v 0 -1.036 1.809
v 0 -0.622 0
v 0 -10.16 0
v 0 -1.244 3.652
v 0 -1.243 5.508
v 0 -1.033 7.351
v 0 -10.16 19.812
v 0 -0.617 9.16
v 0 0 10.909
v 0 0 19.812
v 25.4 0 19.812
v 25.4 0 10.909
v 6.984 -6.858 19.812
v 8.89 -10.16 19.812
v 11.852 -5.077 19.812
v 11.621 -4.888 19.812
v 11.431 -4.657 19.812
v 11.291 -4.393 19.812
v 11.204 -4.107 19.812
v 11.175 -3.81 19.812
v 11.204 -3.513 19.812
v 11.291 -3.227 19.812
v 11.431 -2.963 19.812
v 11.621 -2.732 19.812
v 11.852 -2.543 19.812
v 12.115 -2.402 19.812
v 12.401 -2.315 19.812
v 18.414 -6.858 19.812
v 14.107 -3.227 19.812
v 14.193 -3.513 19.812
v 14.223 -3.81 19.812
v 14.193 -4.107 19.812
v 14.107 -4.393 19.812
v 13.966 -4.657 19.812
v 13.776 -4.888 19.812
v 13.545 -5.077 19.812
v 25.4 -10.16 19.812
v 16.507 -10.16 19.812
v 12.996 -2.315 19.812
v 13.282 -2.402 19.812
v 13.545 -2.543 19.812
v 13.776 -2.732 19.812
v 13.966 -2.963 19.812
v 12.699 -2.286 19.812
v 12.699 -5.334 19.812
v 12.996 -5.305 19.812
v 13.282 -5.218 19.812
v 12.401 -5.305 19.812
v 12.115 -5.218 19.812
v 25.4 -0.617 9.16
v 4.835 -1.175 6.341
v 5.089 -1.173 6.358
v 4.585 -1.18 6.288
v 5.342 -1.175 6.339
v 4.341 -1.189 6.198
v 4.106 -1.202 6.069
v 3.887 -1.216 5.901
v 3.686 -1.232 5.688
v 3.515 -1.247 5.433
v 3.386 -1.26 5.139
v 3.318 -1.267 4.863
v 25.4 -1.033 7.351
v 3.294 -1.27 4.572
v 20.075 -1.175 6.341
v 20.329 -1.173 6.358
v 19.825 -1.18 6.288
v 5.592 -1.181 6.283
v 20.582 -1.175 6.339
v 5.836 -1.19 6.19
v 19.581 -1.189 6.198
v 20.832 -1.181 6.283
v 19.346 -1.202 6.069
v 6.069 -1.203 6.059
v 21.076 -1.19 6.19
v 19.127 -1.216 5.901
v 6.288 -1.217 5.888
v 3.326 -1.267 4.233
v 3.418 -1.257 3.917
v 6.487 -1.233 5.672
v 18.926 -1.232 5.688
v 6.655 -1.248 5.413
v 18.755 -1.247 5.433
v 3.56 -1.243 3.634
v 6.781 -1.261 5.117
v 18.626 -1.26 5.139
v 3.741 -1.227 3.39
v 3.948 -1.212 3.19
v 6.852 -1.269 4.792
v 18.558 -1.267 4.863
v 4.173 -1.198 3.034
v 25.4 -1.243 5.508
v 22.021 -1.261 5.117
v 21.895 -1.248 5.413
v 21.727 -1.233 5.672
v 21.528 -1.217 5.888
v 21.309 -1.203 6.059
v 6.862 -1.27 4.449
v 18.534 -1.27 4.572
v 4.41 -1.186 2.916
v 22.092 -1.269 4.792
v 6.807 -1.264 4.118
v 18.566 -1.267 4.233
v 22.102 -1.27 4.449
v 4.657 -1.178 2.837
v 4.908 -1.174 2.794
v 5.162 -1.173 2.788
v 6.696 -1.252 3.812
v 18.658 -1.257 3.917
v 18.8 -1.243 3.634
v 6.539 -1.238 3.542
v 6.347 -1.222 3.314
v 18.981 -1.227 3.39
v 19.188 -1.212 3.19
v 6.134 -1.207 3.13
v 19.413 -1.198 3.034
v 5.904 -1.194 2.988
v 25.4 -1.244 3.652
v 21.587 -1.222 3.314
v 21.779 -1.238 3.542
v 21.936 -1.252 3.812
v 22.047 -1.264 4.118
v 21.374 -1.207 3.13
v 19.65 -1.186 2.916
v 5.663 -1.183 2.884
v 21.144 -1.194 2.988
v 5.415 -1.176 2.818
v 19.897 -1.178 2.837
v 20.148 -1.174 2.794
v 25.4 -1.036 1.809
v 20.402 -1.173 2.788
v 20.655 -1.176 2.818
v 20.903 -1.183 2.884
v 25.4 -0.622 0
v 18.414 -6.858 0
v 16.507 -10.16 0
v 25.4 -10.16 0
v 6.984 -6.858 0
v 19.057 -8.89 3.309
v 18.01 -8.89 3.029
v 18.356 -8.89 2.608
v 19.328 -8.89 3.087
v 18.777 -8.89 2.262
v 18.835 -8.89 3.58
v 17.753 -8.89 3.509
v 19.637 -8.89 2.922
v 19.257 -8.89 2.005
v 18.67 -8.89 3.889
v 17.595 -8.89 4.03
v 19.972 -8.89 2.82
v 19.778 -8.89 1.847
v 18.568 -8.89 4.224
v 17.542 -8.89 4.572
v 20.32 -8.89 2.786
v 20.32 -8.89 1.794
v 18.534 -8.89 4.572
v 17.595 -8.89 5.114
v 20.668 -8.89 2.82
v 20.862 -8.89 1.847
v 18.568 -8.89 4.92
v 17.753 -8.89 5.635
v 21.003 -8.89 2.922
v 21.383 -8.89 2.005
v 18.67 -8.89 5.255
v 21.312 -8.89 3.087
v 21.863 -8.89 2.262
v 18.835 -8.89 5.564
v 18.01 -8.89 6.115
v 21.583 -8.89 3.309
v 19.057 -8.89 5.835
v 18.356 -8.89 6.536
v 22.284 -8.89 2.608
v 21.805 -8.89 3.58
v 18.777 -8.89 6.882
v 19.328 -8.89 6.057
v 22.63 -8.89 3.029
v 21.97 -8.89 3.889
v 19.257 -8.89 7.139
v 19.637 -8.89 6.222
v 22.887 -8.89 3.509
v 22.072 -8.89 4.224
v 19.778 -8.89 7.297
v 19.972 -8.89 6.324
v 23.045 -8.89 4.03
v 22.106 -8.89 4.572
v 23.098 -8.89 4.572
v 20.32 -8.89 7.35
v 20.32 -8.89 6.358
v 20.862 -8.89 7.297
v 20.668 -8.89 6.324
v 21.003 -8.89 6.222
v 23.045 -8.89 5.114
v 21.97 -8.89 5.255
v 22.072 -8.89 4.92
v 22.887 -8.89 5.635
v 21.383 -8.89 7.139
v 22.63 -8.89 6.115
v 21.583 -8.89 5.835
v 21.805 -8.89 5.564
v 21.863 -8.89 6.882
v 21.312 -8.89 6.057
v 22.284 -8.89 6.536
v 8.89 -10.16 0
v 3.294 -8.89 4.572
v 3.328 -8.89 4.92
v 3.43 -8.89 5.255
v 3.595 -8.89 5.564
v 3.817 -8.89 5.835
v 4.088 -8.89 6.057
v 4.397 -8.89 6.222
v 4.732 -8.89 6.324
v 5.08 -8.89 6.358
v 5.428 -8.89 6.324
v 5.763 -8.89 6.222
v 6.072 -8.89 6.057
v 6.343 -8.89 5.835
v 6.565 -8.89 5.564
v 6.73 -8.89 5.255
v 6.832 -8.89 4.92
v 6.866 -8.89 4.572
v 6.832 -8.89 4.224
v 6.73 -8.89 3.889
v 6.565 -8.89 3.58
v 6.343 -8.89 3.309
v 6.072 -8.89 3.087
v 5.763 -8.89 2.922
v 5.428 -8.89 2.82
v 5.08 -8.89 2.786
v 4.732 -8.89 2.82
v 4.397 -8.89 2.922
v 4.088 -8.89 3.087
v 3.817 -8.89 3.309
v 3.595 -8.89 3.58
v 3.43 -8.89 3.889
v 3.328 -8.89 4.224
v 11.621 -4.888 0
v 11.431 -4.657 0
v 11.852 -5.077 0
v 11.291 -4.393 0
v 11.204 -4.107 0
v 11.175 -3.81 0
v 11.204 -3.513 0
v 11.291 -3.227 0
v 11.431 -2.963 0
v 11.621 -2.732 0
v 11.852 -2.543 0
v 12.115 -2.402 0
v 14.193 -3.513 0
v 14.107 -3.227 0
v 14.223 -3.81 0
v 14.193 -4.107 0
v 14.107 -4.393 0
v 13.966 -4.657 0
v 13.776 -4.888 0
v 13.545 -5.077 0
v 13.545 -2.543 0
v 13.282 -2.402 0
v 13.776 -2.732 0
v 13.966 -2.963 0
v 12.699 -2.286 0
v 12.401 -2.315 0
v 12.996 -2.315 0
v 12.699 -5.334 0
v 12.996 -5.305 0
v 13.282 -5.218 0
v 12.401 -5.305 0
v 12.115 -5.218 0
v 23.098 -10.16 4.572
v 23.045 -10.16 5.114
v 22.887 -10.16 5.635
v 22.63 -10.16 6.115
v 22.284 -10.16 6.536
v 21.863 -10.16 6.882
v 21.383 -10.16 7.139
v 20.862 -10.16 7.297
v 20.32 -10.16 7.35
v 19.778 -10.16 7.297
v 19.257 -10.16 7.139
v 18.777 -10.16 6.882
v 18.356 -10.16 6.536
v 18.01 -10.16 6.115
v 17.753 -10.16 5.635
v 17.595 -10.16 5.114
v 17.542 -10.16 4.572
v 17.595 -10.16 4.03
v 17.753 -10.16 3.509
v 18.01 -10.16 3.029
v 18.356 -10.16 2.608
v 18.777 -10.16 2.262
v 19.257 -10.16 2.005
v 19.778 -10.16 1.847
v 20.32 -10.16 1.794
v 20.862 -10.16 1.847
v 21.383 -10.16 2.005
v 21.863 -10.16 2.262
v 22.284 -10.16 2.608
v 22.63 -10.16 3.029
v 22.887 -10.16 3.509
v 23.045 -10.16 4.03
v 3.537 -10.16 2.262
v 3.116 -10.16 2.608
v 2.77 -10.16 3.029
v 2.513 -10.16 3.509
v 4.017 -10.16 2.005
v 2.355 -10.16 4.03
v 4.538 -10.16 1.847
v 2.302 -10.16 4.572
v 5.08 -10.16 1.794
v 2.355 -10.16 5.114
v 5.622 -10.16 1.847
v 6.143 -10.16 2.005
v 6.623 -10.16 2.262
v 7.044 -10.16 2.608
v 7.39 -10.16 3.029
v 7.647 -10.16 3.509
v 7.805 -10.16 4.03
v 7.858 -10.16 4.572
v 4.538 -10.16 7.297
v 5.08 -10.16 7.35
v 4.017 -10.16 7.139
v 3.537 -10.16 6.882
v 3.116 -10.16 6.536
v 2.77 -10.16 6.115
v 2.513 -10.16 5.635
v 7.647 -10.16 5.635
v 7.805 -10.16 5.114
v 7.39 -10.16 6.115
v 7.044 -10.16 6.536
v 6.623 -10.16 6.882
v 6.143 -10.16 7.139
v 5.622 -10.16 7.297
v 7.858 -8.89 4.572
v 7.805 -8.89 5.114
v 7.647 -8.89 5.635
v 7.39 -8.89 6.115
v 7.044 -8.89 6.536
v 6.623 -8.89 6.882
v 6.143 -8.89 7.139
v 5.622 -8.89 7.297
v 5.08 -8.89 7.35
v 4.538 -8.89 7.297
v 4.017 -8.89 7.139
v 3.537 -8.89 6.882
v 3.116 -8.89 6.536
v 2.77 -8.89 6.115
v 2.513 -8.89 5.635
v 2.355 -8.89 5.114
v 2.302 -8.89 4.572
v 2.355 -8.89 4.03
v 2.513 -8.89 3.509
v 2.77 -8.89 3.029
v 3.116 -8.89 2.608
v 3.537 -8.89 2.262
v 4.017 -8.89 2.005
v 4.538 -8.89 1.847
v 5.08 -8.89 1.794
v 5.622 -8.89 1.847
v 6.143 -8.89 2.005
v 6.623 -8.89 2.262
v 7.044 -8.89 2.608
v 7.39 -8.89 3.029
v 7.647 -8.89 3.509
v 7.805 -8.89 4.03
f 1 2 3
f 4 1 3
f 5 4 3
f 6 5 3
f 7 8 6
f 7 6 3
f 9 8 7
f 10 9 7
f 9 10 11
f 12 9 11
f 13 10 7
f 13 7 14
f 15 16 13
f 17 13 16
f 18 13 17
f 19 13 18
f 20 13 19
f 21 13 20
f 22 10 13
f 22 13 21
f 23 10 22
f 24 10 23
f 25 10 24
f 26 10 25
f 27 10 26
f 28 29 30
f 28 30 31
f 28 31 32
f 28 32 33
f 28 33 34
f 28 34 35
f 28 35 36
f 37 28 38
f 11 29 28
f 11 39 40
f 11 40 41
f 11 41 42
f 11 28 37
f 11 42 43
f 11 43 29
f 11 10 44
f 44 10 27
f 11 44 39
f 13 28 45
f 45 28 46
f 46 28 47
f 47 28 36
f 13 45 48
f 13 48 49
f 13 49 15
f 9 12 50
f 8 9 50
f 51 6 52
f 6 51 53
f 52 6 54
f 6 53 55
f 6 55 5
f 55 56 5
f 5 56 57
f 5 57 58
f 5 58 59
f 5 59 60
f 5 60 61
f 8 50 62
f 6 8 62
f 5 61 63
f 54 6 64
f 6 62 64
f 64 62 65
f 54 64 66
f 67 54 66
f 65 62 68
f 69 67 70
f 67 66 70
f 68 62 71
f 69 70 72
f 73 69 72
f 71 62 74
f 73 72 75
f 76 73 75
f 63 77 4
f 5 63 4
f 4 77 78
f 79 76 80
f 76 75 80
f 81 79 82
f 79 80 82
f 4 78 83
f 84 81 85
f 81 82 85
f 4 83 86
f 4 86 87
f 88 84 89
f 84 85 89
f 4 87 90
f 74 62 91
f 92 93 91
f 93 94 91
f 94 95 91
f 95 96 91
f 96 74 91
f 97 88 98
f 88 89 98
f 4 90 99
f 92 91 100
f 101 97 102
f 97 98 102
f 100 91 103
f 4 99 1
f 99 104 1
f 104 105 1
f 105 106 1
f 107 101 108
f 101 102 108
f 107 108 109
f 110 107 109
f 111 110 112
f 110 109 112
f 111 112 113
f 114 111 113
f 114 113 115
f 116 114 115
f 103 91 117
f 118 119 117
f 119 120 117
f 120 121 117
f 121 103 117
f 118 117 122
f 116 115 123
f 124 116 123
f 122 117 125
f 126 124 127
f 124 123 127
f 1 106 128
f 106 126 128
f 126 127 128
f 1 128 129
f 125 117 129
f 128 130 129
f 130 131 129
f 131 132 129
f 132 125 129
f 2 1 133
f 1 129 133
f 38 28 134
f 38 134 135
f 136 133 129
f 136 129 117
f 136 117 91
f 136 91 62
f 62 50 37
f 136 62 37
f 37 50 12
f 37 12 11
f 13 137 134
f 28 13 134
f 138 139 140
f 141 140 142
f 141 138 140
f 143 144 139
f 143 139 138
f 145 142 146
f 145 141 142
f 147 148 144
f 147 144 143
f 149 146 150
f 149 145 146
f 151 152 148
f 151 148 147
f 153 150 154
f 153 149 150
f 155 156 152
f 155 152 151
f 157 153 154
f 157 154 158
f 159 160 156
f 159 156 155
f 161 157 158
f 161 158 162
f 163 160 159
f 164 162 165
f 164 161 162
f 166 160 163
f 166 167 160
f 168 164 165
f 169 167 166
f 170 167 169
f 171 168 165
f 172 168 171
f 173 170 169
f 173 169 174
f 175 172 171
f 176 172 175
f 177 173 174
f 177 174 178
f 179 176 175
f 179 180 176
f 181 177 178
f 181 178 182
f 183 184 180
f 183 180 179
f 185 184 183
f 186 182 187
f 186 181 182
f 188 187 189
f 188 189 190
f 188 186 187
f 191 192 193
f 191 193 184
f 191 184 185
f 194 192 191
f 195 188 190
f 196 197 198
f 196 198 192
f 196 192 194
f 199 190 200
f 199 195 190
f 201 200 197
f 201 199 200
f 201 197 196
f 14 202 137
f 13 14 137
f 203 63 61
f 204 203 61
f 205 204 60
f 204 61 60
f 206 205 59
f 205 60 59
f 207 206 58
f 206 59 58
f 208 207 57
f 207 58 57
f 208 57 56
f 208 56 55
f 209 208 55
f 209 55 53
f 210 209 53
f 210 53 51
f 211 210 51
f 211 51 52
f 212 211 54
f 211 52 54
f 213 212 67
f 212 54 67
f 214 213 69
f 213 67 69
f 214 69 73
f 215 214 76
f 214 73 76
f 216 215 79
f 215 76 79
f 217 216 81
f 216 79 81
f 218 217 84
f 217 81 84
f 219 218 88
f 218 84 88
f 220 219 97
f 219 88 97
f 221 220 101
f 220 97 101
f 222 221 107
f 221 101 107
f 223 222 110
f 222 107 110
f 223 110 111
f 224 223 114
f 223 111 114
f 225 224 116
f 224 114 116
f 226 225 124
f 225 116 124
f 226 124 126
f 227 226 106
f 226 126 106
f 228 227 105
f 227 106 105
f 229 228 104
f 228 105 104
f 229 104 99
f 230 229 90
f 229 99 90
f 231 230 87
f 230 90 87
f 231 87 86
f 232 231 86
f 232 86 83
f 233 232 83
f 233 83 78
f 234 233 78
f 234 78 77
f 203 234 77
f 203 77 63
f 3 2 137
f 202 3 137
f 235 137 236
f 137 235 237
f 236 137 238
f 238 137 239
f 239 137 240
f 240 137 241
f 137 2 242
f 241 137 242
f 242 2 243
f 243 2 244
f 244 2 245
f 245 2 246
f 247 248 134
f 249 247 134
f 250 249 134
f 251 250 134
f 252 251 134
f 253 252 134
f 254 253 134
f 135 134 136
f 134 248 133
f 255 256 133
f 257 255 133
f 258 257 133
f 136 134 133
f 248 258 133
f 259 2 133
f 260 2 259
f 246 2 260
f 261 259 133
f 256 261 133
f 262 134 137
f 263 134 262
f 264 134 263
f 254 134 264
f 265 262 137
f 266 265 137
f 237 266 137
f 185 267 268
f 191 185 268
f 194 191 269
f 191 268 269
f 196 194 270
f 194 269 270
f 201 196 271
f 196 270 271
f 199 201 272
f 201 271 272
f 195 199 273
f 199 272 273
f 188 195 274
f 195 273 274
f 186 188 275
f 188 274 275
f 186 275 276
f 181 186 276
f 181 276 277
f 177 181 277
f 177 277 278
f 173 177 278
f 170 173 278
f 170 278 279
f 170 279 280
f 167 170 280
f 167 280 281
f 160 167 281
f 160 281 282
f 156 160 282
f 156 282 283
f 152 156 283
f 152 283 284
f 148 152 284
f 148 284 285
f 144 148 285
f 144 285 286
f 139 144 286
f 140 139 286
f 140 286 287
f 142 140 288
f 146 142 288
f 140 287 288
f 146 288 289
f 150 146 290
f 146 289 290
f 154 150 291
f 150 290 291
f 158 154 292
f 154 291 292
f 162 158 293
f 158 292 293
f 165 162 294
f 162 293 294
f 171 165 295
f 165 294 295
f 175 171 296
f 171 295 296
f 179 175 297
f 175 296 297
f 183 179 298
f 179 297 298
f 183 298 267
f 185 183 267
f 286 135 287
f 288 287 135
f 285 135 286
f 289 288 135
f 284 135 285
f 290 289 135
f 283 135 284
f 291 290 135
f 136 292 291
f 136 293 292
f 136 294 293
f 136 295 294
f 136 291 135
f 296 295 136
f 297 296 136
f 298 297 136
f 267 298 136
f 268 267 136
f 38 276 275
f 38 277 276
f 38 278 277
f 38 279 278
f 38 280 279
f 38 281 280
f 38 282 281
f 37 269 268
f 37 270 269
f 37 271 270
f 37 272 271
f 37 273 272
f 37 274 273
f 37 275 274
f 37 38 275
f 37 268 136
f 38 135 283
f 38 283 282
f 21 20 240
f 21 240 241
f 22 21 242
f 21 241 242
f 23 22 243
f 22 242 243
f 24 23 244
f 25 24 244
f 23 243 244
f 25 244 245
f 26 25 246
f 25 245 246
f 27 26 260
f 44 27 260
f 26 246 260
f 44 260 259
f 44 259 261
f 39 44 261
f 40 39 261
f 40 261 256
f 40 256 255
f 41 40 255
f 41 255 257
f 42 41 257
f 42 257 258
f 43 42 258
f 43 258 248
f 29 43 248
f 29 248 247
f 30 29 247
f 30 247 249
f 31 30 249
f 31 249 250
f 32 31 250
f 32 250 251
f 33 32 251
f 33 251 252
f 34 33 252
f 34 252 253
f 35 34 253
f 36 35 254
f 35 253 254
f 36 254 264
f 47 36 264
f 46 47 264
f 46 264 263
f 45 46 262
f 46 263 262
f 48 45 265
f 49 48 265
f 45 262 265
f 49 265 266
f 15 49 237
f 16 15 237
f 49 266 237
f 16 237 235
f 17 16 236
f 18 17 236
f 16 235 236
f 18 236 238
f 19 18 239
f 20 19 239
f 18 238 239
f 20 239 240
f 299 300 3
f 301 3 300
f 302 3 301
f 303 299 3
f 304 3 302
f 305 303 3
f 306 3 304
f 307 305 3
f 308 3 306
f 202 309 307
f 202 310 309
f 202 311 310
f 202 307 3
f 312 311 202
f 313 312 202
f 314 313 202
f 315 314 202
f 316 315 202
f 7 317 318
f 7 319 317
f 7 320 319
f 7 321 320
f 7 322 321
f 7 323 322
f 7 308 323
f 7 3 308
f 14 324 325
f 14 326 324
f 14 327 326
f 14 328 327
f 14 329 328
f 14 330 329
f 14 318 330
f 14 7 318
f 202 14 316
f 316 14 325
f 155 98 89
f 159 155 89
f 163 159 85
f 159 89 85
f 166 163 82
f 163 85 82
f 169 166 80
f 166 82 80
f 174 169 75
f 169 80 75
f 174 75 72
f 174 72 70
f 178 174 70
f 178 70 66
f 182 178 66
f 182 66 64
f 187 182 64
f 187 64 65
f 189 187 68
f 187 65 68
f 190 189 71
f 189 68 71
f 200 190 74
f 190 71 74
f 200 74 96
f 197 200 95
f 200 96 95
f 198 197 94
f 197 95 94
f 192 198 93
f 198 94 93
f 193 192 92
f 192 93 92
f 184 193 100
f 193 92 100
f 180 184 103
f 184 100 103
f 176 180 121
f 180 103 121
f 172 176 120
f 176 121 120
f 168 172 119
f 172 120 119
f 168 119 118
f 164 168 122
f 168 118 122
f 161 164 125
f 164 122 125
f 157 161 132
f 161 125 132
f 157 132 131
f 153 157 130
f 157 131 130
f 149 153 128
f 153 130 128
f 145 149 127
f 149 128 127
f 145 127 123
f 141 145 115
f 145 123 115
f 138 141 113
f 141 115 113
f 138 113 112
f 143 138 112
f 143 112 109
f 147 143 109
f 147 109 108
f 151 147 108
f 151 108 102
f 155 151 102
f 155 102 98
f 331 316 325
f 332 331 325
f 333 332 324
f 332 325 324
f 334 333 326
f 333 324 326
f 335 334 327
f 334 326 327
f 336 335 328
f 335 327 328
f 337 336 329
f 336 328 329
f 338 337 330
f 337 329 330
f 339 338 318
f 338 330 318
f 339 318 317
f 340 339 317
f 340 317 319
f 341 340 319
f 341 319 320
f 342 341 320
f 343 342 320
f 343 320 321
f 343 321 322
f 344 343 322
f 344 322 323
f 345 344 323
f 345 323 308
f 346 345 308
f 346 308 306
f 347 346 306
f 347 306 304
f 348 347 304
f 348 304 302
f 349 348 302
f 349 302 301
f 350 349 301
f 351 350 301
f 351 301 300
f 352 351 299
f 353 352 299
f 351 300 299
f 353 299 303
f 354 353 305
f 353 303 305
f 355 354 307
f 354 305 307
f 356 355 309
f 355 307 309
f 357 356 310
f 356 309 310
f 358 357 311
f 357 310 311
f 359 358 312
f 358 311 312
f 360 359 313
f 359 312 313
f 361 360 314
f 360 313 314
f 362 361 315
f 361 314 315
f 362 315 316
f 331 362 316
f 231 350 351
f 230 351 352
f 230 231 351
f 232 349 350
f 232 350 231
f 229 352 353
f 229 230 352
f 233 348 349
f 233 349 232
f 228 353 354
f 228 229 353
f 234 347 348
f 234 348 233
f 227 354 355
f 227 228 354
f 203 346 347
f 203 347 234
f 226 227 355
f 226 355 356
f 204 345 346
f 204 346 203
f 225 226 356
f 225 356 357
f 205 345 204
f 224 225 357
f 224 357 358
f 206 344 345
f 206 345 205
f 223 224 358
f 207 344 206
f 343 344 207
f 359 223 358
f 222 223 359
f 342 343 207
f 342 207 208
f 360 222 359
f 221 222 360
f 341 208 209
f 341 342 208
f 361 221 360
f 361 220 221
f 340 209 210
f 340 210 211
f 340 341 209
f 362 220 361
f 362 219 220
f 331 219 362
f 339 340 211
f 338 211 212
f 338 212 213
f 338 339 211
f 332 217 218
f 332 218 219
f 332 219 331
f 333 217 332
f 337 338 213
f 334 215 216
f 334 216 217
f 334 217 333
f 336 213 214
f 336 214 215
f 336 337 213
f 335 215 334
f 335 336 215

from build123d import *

# Parameters (mm, degrees)
F0_W           = 25.4
F0_H           = 19.812
F1_DEPTH       = 10.16
F3_D           = 3.571875
F3_CBORE_D     = 5.55625
F3_CBORE_DEPTH = 1.27
F4_D           = 3.571875
F4_CBORE_D     = 5.55625
F4_CBORE_DEPTH = 1.27
F6_DEPTH       = 19.813
F8_D           = 3.048
F10_DEPTH      = 25.4


with BuildPart() as f1:
    # F0 (on Front) → F1 (new body)
    with BuildSketch(Plane.XZ):
        with Locations((12.7, 9.906)):
            Rectangle(F0_W, F0_H)
    extrude(amount=F1_DEPTH)

    # F3 (through all)
    with Locations(Plane.XZ.offset(10.16)):
        with Locations((5.08, 4.572)):
            CounterBoreHole(F3_D / 2, F3_CBORE_D / 2, F3_CBORE_DEPTH)

    # F4 (through all)
    with Locations(Plane.XZ.offset(10.16)):
        with Locations((20.32, 4.572)):
            CounterBoreHole(F4_D / 2, F4_CBORE_D / 2, F4_CBORE_DEPTH)

    # F5 (on face) → F6 (cut, through all)
    with BuildSketch(Plane(origin=(0, 0, 0), x_dir=(1, 0, 0), z_dir=(0, 0, -1))):
        Polygon((16.5071788223, 10.16), (8.89, 10.16), (6.9835894111, 6.858), (18.4135894111, 6.858), align=None)
    extrude(amount=-F6_DEPTH, mode=Mode.SUBTRACT)

    # F8 (through all)
    with Locations(Plane.XY.offset(19.812)):
        with Locations((12.6985894111, -3.8099997389)):
            Hole(F8_D / 2)

    # F9 (on face) → F10 (cut)
    with BuildSketch(Plane.YZ.offset(25.4)):
        with BuildLine():
            ThreePointArc((31.623, 4.572), (15.1765, 21.0185), (-1.27, 4.572))
            Line((-1.27, 4.572), (0, 4.572))
            Line((0, 4.572), (31.623, 4.572))
        make_face()
        with BuildLine():
            Line((0, 4.572), (-1.27, 4.572))
            ThreePointArc((-1.27, 4.572), (15.1765, -11.8745), (31.623, 4.572))
            Line((31.623, 4.572), (0, 4.572))
        make_face()
    extrude(amount=-F10_DEPTH, mode=Mode.SUBTRACT)


solid = f1.part
